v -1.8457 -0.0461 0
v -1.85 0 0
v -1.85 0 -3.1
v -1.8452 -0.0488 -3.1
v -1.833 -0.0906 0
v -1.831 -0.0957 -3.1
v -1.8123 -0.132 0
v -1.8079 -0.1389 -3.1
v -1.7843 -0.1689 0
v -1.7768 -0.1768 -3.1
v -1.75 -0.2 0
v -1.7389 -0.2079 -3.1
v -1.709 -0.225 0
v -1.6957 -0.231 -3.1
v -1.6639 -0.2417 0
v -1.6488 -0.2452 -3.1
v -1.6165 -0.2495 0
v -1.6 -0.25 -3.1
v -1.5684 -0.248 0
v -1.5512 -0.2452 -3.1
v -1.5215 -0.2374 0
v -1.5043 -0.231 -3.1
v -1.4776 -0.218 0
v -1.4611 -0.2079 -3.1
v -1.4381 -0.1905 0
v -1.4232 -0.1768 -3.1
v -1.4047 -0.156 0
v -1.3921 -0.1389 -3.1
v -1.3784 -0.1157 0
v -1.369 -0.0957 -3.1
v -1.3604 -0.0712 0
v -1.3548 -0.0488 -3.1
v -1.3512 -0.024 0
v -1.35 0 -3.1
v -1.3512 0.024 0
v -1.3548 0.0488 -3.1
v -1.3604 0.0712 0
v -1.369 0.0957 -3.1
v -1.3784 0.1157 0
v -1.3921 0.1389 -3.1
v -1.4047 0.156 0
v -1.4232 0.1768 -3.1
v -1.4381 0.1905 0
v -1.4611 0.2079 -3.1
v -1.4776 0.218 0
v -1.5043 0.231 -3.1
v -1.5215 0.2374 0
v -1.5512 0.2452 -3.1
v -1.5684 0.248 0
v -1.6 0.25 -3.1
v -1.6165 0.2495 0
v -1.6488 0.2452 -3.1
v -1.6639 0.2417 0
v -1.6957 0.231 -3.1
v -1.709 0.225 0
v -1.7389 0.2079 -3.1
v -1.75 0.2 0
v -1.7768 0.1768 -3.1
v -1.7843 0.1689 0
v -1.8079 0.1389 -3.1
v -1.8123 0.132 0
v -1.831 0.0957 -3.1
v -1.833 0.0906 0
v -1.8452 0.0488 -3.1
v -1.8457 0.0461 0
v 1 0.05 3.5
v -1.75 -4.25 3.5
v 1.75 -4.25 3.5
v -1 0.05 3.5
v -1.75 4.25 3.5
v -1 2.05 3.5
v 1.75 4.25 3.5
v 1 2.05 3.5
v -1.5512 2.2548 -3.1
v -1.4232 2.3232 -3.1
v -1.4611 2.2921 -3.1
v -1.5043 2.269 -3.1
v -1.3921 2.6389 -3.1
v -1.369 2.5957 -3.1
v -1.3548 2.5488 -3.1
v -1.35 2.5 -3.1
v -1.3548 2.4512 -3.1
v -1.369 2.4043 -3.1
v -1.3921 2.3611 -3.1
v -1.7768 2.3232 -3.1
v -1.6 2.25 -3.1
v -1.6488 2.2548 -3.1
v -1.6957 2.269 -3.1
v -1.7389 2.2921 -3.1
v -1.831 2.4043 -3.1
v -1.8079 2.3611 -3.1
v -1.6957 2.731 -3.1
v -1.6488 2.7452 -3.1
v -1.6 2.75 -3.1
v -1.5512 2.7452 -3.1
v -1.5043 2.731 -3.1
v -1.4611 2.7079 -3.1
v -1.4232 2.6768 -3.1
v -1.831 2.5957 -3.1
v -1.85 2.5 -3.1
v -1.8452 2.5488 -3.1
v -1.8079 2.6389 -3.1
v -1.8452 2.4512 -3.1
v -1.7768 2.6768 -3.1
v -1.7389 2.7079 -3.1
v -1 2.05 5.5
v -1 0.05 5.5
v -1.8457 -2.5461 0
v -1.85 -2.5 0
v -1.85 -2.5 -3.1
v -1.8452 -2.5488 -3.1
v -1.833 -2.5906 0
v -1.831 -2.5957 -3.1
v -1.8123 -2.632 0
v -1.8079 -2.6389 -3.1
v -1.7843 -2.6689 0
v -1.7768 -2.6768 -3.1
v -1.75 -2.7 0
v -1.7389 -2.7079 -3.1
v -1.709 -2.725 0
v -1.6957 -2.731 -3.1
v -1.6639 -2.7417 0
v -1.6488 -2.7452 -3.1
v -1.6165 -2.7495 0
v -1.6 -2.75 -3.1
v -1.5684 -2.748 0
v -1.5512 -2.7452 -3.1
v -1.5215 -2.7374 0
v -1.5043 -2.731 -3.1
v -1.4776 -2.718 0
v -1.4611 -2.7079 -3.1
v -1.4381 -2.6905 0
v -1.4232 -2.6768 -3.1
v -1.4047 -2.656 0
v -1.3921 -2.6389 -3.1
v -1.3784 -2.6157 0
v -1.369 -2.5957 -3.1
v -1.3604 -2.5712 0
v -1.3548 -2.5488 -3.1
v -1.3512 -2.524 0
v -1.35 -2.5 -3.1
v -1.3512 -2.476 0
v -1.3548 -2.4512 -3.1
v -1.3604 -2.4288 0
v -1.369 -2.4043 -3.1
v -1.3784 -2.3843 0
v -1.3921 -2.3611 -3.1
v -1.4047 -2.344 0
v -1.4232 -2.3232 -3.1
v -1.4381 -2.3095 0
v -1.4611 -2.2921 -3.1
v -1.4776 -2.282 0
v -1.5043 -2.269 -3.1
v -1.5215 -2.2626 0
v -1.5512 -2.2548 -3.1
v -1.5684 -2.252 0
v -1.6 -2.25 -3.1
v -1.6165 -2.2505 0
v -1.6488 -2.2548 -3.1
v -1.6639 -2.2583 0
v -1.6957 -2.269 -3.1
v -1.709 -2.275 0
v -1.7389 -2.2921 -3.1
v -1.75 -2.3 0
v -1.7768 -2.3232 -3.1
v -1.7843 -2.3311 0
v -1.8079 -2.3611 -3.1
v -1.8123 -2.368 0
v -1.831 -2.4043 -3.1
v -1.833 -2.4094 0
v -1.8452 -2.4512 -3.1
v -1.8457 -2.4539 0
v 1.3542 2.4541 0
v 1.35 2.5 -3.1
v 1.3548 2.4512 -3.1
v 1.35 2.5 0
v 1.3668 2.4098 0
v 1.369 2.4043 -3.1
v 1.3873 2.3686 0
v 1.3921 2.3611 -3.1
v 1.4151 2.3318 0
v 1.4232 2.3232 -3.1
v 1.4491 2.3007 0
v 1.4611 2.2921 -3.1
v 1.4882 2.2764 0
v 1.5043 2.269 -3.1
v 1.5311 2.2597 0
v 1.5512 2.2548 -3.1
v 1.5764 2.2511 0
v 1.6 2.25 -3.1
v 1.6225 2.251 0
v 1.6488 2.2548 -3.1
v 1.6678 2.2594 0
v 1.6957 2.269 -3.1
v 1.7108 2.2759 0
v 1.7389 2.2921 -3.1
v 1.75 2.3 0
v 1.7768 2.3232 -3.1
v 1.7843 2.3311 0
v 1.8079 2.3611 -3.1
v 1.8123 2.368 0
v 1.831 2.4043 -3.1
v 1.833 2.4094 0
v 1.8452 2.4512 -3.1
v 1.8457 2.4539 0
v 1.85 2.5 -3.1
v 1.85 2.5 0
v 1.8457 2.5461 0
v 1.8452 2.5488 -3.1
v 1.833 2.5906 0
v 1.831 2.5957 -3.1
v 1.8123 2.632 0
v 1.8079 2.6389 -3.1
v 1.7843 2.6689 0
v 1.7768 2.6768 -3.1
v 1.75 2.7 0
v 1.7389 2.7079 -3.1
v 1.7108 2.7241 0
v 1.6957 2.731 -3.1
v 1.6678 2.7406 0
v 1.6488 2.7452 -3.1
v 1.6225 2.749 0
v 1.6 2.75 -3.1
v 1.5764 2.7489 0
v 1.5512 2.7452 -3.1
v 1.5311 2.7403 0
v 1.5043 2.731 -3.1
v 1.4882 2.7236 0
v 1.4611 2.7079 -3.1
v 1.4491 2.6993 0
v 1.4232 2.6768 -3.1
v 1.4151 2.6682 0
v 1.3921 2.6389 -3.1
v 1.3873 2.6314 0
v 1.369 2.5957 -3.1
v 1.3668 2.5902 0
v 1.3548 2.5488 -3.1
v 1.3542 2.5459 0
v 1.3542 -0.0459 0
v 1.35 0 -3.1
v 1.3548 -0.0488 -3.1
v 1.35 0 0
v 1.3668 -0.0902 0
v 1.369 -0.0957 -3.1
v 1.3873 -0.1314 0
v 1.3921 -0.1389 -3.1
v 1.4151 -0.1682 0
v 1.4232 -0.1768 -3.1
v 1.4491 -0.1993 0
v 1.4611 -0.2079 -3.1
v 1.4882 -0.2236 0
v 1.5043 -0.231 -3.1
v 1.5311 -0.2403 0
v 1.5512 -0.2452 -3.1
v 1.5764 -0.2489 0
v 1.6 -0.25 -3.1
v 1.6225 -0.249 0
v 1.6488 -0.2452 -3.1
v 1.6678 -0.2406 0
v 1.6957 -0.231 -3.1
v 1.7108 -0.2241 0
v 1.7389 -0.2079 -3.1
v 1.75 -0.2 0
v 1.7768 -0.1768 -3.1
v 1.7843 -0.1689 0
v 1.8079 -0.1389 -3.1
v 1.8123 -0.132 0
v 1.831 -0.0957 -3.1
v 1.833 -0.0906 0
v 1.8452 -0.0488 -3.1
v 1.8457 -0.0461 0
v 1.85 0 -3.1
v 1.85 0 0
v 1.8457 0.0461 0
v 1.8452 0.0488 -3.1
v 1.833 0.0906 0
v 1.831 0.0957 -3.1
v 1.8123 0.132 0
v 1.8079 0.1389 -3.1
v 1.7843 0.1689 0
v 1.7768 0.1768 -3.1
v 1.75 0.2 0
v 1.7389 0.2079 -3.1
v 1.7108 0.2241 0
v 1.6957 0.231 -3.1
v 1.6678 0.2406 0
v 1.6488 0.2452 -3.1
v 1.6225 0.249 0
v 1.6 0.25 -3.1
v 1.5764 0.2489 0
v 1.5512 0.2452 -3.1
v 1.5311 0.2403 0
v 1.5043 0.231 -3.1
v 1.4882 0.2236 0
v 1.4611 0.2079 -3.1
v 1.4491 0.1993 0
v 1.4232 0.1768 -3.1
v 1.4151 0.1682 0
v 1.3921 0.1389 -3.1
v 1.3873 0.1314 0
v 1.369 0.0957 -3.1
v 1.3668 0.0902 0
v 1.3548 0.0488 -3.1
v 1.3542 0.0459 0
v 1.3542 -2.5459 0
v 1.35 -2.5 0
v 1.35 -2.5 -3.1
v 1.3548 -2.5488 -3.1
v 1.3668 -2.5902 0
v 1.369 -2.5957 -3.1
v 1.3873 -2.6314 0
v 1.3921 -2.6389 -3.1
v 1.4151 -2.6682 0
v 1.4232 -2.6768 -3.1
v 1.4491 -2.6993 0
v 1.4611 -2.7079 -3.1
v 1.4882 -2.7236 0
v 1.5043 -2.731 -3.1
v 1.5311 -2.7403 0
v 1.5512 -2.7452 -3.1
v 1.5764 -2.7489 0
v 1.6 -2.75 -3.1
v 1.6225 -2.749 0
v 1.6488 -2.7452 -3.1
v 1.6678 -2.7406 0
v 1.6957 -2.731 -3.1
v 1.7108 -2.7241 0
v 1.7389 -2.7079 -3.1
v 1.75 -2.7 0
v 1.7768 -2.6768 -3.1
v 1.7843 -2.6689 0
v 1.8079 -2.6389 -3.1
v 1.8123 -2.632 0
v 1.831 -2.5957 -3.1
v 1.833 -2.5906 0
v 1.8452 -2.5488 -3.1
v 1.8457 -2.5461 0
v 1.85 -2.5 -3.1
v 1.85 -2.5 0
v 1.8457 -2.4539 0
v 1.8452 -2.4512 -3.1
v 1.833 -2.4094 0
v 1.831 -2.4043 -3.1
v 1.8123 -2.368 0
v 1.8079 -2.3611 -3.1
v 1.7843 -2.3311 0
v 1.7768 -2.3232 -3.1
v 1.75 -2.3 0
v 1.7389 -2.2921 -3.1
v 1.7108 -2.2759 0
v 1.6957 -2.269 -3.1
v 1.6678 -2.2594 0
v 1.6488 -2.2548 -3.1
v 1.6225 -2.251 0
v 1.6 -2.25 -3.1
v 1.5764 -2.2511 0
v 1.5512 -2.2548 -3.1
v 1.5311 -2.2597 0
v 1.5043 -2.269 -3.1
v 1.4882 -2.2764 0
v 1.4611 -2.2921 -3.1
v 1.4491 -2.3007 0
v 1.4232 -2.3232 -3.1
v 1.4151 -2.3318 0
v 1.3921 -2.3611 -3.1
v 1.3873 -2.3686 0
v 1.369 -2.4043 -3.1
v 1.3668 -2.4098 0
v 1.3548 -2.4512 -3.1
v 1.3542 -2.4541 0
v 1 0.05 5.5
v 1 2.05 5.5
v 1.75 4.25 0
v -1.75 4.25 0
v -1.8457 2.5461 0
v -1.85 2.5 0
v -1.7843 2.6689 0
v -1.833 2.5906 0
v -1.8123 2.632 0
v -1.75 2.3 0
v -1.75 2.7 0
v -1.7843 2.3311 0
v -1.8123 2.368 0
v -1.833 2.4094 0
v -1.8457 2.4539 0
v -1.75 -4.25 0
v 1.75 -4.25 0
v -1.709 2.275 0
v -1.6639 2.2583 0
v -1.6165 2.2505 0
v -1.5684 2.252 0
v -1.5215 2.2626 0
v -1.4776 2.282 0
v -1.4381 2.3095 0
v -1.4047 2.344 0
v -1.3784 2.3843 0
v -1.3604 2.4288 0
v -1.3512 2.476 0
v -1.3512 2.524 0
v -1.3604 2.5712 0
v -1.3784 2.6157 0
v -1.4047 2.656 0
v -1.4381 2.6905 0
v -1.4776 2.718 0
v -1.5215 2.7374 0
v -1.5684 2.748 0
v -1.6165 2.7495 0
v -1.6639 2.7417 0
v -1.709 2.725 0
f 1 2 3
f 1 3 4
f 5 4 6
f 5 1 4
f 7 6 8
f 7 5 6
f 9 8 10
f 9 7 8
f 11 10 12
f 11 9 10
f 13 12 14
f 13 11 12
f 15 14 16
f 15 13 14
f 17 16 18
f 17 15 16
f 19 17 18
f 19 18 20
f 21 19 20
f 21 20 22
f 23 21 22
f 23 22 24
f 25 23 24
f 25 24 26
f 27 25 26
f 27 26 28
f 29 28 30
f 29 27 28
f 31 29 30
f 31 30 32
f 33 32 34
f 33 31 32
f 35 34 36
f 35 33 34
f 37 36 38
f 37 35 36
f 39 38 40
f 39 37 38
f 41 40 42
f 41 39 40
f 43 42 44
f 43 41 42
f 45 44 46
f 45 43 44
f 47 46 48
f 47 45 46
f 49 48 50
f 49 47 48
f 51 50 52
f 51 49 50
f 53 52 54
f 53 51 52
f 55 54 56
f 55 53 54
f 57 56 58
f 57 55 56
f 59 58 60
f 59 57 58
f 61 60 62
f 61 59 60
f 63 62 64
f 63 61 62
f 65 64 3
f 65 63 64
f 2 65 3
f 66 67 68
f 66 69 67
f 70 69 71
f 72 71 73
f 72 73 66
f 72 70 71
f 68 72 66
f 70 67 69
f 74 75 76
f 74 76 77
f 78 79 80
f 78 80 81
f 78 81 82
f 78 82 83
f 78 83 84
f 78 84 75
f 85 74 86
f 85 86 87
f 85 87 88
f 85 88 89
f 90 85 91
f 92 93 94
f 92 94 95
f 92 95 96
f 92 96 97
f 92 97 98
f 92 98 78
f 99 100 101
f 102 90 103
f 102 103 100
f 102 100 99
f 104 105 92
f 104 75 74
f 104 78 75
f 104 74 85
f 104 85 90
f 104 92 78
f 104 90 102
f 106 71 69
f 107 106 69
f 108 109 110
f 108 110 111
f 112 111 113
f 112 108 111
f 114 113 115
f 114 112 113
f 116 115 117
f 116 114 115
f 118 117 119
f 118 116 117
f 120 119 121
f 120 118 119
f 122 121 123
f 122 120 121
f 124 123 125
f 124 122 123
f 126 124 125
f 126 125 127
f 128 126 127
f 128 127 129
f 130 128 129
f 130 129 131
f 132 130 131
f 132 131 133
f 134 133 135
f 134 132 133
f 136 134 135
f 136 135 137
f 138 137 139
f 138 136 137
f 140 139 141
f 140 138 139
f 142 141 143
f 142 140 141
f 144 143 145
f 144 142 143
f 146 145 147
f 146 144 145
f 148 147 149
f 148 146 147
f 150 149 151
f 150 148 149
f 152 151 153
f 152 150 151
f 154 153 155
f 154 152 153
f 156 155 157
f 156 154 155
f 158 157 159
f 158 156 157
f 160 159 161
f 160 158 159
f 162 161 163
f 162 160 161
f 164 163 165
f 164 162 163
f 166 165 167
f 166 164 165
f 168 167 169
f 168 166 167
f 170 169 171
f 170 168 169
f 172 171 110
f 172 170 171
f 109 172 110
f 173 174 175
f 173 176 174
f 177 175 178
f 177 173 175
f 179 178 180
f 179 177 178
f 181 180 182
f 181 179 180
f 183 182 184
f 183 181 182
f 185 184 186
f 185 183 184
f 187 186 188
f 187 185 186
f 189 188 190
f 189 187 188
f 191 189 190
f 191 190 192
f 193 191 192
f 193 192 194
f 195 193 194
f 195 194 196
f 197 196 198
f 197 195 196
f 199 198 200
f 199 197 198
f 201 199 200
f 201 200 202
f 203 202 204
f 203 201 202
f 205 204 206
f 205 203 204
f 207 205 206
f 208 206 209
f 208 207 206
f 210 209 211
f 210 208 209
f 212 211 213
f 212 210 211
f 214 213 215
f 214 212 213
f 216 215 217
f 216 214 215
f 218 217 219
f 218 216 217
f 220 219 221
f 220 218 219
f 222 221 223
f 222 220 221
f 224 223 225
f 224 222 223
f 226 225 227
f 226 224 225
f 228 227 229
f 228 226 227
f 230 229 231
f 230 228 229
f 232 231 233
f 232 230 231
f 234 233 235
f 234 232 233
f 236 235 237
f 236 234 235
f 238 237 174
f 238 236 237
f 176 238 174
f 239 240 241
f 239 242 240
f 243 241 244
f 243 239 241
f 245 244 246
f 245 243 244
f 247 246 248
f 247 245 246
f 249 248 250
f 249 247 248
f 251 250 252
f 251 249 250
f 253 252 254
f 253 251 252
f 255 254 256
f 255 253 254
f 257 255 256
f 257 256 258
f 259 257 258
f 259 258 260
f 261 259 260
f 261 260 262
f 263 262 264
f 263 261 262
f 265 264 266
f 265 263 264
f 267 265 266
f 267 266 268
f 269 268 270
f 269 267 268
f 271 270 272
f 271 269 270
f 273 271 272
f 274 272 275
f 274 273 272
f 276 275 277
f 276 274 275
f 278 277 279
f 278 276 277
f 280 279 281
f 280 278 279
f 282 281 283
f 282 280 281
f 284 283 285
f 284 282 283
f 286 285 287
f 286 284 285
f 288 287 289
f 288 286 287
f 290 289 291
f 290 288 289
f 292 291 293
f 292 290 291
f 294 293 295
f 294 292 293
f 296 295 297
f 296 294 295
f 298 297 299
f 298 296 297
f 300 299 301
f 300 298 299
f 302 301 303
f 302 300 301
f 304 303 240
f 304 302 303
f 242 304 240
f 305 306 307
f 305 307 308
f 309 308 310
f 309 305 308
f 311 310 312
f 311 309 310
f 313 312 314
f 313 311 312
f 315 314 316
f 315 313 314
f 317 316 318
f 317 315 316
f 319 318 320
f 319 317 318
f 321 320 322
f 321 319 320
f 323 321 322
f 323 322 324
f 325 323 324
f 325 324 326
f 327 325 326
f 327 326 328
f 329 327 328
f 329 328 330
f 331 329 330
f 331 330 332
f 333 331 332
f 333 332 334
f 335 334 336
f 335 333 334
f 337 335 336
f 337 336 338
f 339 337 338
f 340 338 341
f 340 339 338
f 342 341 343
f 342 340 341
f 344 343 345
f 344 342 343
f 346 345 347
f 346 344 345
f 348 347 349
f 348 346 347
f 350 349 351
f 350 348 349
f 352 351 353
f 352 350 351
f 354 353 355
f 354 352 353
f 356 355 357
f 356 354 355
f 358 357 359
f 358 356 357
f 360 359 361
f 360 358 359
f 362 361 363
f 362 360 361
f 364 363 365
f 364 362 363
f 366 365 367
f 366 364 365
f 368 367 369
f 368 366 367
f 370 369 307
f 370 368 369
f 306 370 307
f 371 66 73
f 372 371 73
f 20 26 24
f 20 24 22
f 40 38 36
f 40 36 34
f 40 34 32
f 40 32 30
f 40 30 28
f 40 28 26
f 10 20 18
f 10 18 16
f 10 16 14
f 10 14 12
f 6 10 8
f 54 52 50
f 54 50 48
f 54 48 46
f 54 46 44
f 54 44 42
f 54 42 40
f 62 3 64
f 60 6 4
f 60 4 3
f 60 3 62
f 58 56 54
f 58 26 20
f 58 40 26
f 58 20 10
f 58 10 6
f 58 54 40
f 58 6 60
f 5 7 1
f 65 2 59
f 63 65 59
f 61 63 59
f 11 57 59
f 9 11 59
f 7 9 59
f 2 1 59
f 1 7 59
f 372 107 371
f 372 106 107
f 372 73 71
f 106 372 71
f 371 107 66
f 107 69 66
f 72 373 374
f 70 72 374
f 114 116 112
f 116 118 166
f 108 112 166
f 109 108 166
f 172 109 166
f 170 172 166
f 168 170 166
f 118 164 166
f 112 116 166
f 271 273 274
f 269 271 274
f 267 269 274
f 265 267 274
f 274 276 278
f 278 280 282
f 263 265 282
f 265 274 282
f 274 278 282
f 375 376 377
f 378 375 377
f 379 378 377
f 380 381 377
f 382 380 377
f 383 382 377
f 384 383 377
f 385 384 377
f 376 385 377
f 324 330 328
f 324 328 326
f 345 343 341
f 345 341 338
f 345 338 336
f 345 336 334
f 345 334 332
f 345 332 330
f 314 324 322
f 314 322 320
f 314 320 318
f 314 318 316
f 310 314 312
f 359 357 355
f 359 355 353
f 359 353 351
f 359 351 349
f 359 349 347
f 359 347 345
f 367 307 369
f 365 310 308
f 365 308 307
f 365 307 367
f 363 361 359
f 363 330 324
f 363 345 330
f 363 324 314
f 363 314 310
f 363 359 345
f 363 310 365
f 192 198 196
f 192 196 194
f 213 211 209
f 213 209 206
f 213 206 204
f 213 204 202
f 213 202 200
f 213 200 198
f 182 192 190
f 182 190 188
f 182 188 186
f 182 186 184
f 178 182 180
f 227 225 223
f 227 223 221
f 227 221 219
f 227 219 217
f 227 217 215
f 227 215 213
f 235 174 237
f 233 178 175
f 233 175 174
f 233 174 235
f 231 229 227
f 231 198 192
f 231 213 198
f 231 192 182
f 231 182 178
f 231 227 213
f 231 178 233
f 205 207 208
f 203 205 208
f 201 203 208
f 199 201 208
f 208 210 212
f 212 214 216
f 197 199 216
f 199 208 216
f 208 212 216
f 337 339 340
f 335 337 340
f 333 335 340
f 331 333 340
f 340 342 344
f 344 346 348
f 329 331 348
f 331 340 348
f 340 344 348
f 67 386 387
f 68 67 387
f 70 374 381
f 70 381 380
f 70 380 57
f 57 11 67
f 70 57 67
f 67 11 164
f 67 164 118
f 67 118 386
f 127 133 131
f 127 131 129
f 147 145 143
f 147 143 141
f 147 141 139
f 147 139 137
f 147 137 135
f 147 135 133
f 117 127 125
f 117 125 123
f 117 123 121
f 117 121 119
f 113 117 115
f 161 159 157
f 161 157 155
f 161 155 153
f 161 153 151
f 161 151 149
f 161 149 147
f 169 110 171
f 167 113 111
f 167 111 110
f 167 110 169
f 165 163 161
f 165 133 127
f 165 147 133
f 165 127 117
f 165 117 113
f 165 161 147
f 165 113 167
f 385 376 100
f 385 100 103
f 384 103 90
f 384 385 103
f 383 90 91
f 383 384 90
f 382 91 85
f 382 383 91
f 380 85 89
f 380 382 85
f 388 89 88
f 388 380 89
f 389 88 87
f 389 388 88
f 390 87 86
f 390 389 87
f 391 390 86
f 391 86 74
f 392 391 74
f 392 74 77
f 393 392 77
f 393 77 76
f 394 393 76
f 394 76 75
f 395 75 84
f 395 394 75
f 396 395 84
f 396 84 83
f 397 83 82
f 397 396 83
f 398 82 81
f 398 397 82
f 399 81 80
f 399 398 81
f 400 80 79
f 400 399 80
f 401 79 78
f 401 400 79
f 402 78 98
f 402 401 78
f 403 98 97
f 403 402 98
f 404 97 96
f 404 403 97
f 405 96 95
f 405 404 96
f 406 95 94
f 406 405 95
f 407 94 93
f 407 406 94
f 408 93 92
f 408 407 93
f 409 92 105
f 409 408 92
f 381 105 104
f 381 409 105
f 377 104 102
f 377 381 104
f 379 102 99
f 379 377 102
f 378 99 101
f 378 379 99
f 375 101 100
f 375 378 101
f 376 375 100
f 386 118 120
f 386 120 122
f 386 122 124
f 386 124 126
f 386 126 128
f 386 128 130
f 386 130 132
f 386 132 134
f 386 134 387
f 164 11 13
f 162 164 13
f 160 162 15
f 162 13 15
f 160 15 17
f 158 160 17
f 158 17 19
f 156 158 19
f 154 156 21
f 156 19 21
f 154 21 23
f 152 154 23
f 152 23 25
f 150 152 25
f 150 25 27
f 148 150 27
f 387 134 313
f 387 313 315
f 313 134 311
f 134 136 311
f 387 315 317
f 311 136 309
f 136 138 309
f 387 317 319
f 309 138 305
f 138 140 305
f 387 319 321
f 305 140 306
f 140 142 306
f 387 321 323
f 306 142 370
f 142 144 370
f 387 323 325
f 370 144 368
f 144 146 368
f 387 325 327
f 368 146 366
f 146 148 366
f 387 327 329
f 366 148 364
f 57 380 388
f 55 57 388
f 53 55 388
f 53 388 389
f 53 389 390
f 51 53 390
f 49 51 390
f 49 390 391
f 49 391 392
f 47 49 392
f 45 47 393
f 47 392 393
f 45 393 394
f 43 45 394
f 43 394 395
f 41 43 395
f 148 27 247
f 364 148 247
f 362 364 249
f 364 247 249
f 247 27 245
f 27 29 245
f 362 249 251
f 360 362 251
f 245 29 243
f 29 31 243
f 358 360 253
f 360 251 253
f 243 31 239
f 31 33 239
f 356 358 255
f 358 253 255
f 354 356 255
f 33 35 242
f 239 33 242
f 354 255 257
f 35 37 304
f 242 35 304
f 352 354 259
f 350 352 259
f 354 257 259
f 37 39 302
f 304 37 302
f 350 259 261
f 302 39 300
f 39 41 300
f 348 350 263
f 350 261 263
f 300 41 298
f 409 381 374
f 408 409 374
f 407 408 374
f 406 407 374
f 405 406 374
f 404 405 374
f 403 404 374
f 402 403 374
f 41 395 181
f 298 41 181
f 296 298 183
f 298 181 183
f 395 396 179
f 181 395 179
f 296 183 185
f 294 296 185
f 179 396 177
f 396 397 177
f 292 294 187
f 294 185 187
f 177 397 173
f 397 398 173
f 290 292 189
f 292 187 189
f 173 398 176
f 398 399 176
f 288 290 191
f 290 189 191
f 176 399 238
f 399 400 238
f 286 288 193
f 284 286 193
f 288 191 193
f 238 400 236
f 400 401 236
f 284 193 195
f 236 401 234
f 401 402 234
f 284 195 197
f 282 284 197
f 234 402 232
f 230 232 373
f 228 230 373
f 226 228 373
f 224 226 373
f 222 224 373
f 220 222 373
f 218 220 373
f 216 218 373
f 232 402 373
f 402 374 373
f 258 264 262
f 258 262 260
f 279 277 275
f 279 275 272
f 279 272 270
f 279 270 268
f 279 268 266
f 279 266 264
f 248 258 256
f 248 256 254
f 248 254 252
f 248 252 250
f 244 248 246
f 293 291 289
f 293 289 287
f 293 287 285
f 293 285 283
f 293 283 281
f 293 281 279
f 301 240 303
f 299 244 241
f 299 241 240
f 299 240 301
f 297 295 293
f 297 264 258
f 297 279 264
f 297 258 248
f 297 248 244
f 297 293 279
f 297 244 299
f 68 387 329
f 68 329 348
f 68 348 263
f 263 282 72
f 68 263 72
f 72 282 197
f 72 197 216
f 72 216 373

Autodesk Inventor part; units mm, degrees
ref_plane "YZ Plane" through (0, 0, 0) normal (1, 0, 0) x (0, 1, 0)
ref_plane "XZ Plane" through (0, 0, 0) normal (0, 1, 0) x (-1, 0, 0)
ref_plane "XY Plane" through (0, 0, 0) normal (0, 0, 1) x (1, 0, 0)
sketch "スケッチ1" plane through (0, 0, 0) normal (0, 0, 1) x (1, 0, 0)
  line L0 (-1.75, -4.25) -> (1.75, -4.25)
  line L1 (1.75, -4.25) -> (1.75, 4.25)
  line L2 (1.75, 4.25) -> (-1.75, 4.25)
  line L3 (-1.75, 4.25) -> (-1.75, -4.25)
  line L4 (-1.75, -4.25) -> (1.75, 4.25) construction
  line L5 (1.75, -4.25) -> (-1.75, 4.25) construction
  point P0 (0, 0)
  dimension "d0" = 3.5
  dimension "d1" = 8.5
extrude "押し出し1" add sketch "スケッチ1" along normal blind 3.5
sketch "スケッチ2" plane through (0, 0, 0) normal (0, 0, -1) x (-1, 0, 0)
  line L0 (1.6, -2.5) -> (-1.6, -2.5) construction
  line L1 (-1.6, -2.5) -> (-1.6, 2.5) construction
  line L2 (-1.6, 2.5) -> (1.6, 2.5) construction
  line L3 (1.6, 2.5) -> (1.6, -2.5) construction
  line L4 (1.6, -2.5) -> (-1.6, 2.5) construction
  line L5 (-1.6, -2.5) -> (1.6, 2.5) construction
  circle A0 centre (-1.6, -2.5) radius 0.25
  point P0 (0, 0)
  dimension "d4" = 3.2
  dimension "d5" = 5
  dimension "d6" = 0.5
extrude "押し出し2" add sketch "スケッチ2" along normal blind 3.1
pattern_linear "矩形状パターン1" count 3 spacing 2.5 along (0, 1, 0) count 2 spacing 3.2 along (-1, 0, 0) of "押し出し2"
sketch "スケッチ3" plane through (0, 0, 3.5) normal (0, 0, 1) x (1, 0, 0)
  line L0 (-1, 0.05) -> (1, 0.05)
  line L1 (1, 0.05) -> (1, 2.05)
  line L2 (1, 2.05) -> (-1, 2.05)
  line L3 (-1, 2.05) -> (-1, 0.05)
  line L4 (-1, 0.05) -> (1, 2.05) construction
  line L5 (1, 0.05) -> (-1, 2.05) construction
  line L6 (1.75, 4.25) -> (-1.75, 4.25) projected
  point P0 (0, 0)
  point P1 (0, 1.05)
  point P2 (0, 1.05)
  dimension "d15" = 2
  dimension "d16" = 4.2
extrude "押し出し3" add sketch "スケッチ3" along normal blind 2
properties part number "IS-1250"
